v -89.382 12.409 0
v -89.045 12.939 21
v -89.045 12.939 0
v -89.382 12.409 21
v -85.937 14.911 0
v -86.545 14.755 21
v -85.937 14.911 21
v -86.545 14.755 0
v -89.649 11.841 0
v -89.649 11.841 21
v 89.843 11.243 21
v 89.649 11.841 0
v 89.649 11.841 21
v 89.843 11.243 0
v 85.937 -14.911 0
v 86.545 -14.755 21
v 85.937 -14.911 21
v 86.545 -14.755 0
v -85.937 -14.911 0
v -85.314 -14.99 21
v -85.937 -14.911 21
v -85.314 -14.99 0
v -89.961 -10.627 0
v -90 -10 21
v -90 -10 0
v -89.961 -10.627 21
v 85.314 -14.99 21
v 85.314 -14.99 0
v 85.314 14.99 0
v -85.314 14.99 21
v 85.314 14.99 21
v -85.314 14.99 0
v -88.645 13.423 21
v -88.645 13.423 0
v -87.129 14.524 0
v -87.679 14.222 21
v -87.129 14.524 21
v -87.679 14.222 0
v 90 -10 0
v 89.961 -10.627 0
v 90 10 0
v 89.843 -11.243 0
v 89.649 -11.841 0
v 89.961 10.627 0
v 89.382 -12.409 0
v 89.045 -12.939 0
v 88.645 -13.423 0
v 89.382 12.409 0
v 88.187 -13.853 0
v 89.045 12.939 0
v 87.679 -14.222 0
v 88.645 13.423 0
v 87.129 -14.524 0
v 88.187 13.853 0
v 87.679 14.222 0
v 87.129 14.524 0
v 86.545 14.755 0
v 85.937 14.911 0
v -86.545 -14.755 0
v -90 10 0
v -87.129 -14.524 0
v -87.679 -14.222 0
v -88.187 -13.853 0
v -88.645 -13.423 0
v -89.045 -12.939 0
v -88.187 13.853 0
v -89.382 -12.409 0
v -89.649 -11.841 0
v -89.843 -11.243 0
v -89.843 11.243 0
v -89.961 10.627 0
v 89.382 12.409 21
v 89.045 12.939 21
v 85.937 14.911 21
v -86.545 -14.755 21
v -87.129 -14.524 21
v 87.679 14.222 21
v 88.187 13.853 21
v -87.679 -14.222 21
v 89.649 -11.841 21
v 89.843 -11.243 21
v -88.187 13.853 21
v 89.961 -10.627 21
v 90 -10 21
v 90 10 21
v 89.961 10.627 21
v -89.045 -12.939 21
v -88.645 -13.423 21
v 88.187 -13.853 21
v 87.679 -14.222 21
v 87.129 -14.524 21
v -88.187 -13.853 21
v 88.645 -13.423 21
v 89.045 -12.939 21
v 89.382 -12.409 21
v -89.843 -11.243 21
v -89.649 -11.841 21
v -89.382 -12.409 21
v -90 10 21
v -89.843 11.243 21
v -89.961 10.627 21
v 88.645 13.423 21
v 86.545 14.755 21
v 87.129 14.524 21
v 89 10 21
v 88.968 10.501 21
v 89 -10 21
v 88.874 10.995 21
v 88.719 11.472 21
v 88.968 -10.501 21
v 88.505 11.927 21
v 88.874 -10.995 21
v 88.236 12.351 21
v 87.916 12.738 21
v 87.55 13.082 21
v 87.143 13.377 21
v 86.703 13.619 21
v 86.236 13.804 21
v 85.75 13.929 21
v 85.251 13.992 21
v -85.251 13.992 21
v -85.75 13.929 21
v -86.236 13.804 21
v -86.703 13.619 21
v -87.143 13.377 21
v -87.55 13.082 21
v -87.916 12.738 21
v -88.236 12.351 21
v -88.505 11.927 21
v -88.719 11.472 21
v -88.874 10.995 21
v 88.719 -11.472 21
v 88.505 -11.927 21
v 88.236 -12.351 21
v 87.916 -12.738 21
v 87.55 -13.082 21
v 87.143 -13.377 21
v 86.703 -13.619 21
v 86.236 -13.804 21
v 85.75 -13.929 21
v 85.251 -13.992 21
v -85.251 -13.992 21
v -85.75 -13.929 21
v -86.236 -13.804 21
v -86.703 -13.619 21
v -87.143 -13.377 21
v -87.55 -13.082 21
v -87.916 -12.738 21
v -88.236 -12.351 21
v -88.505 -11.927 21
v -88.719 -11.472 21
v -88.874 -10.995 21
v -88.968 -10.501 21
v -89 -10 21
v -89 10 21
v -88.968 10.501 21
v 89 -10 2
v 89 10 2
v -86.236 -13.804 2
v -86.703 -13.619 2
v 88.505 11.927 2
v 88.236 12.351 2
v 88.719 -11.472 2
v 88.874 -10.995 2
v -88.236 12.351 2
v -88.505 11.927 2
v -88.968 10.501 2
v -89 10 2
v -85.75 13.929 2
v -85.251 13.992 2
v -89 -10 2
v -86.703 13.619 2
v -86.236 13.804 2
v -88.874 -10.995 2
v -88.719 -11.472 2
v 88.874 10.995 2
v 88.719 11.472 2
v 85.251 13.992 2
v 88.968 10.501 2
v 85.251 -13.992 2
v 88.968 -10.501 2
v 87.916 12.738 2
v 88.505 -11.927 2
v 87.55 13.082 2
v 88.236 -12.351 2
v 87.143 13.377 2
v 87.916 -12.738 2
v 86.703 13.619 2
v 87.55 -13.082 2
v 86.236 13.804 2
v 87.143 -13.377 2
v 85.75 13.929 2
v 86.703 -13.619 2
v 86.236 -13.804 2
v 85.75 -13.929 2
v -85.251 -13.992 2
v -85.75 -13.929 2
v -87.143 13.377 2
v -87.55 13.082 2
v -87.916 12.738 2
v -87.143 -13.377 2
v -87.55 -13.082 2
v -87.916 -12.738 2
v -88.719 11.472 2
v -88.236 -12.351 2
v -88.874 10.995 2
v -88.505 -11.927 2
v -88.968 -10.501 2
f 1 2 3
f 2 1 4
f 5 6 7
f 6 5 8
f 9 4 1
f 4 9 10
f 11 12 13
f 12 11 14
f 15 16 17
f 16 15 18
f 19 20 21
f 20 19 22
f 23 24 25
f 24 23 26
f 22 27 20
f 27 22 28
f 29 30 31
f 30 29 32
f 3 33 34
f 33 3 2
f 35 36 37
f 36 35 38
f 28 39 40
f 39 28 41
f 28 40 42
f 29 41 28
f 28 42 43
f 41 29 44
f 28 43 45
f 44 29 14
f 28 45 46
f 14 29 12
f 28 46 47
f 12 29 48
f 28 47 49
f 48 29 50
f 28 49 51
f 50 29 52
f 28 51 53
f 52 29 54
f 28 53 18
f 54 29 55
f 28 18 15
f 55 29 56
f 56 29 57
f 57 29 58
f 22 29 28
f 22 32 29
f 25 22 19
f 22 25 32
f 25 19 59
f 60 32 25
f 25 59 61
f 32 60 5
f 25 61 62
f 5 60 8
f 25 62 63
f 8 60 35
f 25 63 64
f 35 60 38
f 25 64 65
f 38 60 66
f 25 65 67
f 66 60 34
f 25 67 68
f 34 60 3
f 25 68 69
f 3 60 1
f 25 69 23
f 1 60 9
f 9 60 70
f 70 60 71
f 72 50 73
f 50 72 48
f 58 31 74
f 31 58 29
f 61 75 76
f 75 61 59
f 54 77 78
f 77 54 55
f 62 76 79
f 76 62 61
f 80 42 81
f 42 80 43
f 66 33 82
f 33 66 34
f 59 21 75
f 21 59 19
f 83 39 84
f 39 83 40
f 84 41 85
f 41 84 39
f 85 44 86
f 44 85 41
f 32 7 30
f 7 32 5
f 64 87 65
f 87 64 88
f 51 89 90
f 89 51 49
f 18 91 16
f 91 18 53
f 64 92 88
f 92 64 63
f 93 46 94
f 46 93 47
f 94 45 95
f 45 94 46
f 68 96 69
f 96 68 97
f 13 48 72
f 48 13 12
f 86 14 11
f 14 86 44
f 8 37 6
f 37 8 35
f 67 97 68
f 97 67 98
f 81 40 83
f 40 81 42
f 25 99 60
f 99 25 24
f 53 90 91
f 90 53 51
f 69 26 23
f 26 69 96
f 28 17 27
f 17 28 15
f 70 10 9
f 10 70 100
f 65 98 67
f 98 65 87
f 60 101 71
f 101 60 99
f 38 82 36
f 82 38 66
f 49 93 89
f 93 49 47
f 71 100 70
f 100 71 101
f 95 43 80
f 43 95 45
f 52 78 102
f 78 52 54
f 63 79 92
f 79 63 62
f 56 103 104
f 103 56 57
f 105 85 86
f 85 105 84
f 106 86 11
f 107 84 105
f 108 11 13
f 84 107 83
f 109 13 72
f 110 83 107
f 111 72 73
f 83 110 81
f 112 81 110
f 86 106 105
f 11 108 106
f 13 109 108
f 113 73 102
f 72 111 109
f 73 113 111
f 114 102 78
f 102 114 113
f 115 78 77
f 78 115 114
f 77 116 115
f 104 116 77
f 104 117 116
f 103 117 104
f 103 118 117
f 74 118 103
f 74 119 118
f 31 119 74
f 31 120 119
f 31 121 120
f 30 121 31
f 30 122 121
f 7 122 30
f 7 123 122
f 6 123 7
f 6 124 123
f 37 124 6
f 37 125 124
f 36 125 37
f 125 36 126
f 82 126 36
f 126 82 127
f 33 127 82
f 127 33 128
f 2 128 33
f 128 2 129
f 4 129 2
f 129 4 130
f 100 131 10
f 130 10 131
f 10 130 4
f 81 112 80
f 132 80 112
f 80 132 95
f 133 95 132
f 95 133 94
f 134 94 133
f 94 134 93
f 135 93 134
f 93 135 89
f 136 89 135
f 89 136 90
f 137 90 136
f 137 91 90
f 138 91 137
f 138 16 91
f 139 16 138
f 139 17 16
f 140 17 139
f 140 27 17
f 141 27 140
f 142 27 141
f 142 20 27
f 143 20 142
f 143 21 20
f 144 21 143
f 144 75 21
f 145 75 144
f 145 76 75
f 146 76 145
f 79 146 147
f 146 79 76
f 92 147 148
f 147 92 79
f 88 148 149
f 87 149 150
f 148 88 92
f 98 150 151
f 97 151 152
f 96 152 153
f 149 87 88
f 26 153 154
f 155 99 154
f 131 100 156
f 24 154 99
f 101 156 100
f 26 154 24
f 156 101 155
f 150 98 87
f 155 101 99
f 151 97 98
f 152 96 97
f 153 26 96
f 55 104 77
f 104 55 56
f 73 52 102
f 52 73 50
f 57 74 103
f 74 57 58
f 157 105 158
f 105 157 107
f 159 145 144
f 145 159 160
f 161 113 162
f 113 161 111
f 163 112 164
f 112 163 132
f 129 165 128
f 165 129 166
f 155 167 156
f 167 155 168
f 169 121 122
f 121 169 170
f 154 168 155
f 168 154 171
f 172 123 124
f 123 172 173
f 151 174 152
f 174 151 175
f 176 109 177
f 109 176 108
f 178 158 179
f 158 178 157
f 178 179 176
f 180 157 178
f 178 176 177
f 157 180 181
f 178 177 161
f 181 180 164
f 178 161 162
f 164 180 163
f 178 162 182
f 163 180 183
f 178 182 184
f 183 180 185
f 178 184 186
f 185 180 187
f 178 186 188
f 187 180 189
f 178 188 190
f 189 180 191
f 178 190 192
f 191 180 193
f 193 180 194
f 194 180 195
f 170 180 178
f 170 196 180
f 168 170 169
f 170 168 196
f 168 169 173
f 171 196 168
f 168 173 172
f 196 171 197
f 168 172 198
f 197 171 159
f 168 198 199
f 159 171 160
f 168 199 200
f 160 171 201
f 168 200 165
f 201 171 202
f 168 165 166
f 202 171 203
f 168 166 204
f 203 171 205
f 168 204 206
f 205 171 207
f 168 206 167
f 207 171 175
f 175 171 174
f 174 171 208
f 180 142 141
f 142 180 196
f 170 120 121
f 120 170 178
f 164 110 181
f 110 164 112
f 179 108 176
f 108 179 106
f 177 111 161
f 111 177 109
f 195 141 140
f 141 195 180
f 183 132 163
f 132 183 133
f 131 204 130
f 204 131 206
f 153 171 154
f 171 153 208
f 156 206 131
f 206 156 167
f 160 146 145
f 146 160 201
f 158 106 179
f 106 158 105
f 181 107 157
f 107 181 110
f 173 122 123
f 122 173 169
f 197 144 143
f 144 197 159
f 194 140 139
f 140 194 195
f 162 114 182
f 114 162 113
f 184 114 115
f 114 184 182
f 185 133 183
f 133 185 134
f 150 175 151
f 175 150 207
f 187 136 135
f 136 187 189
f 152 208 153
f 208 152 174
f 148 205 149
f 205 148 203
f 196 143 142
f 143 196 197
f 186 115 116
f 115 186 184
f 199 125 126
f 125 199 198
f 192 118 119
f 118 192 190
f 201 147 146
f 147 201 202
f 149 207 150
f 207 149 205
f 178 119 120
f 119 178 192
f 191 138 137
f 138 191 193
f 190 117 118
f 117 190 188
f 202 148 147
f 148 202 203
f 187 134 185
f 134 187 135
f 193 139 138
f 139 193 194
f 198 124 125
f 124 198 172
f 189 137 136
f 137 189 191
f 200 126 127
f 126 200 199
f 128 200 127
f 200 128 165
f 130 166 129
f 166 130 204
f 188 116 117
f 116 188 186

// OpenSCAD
$fn = 50;


difference() {
	union() {
		hull() {
			translate(v = [-85.0000000000, 10.0000000000, 0]) {
				cylinder(h = 21, r = 5);
			}
			translate(v = [85.0000000000, 10.0000000000, 0]) {
				cylinder(h = 21, r = 5);
			}
			translate(v = [-85.0000000000, -10.0000000000, 0]) {
				cylinder(h = 21, r = 5);
			}
			translate(v = [85.0000000000, -10.0000000000, 0]) {
				cylinder(h = 21, r = 5);
			}
		}
	}
	union() {
		translate(v = [0, 0, 2]) {
			hull() {
				translate(v = [-85.0000000000, 10.0000000000, 0]) {
					cylinder(h = 19, r = 4);
				}
				translate(v = [85.0000000000, 10.0000000000, 0]) {
					cylinder(h = 19, r = 4);
				}
				translate(v = [-85.0000000000, -10.0000000000, 0]) {
					cylinder(h = 19, r = 4);
				}
				translate(v = [85.0000000000, -10.0000000000, 0]) {
					cylinder(h = 19, r = 4);
				}
			}
		}
	}
}
